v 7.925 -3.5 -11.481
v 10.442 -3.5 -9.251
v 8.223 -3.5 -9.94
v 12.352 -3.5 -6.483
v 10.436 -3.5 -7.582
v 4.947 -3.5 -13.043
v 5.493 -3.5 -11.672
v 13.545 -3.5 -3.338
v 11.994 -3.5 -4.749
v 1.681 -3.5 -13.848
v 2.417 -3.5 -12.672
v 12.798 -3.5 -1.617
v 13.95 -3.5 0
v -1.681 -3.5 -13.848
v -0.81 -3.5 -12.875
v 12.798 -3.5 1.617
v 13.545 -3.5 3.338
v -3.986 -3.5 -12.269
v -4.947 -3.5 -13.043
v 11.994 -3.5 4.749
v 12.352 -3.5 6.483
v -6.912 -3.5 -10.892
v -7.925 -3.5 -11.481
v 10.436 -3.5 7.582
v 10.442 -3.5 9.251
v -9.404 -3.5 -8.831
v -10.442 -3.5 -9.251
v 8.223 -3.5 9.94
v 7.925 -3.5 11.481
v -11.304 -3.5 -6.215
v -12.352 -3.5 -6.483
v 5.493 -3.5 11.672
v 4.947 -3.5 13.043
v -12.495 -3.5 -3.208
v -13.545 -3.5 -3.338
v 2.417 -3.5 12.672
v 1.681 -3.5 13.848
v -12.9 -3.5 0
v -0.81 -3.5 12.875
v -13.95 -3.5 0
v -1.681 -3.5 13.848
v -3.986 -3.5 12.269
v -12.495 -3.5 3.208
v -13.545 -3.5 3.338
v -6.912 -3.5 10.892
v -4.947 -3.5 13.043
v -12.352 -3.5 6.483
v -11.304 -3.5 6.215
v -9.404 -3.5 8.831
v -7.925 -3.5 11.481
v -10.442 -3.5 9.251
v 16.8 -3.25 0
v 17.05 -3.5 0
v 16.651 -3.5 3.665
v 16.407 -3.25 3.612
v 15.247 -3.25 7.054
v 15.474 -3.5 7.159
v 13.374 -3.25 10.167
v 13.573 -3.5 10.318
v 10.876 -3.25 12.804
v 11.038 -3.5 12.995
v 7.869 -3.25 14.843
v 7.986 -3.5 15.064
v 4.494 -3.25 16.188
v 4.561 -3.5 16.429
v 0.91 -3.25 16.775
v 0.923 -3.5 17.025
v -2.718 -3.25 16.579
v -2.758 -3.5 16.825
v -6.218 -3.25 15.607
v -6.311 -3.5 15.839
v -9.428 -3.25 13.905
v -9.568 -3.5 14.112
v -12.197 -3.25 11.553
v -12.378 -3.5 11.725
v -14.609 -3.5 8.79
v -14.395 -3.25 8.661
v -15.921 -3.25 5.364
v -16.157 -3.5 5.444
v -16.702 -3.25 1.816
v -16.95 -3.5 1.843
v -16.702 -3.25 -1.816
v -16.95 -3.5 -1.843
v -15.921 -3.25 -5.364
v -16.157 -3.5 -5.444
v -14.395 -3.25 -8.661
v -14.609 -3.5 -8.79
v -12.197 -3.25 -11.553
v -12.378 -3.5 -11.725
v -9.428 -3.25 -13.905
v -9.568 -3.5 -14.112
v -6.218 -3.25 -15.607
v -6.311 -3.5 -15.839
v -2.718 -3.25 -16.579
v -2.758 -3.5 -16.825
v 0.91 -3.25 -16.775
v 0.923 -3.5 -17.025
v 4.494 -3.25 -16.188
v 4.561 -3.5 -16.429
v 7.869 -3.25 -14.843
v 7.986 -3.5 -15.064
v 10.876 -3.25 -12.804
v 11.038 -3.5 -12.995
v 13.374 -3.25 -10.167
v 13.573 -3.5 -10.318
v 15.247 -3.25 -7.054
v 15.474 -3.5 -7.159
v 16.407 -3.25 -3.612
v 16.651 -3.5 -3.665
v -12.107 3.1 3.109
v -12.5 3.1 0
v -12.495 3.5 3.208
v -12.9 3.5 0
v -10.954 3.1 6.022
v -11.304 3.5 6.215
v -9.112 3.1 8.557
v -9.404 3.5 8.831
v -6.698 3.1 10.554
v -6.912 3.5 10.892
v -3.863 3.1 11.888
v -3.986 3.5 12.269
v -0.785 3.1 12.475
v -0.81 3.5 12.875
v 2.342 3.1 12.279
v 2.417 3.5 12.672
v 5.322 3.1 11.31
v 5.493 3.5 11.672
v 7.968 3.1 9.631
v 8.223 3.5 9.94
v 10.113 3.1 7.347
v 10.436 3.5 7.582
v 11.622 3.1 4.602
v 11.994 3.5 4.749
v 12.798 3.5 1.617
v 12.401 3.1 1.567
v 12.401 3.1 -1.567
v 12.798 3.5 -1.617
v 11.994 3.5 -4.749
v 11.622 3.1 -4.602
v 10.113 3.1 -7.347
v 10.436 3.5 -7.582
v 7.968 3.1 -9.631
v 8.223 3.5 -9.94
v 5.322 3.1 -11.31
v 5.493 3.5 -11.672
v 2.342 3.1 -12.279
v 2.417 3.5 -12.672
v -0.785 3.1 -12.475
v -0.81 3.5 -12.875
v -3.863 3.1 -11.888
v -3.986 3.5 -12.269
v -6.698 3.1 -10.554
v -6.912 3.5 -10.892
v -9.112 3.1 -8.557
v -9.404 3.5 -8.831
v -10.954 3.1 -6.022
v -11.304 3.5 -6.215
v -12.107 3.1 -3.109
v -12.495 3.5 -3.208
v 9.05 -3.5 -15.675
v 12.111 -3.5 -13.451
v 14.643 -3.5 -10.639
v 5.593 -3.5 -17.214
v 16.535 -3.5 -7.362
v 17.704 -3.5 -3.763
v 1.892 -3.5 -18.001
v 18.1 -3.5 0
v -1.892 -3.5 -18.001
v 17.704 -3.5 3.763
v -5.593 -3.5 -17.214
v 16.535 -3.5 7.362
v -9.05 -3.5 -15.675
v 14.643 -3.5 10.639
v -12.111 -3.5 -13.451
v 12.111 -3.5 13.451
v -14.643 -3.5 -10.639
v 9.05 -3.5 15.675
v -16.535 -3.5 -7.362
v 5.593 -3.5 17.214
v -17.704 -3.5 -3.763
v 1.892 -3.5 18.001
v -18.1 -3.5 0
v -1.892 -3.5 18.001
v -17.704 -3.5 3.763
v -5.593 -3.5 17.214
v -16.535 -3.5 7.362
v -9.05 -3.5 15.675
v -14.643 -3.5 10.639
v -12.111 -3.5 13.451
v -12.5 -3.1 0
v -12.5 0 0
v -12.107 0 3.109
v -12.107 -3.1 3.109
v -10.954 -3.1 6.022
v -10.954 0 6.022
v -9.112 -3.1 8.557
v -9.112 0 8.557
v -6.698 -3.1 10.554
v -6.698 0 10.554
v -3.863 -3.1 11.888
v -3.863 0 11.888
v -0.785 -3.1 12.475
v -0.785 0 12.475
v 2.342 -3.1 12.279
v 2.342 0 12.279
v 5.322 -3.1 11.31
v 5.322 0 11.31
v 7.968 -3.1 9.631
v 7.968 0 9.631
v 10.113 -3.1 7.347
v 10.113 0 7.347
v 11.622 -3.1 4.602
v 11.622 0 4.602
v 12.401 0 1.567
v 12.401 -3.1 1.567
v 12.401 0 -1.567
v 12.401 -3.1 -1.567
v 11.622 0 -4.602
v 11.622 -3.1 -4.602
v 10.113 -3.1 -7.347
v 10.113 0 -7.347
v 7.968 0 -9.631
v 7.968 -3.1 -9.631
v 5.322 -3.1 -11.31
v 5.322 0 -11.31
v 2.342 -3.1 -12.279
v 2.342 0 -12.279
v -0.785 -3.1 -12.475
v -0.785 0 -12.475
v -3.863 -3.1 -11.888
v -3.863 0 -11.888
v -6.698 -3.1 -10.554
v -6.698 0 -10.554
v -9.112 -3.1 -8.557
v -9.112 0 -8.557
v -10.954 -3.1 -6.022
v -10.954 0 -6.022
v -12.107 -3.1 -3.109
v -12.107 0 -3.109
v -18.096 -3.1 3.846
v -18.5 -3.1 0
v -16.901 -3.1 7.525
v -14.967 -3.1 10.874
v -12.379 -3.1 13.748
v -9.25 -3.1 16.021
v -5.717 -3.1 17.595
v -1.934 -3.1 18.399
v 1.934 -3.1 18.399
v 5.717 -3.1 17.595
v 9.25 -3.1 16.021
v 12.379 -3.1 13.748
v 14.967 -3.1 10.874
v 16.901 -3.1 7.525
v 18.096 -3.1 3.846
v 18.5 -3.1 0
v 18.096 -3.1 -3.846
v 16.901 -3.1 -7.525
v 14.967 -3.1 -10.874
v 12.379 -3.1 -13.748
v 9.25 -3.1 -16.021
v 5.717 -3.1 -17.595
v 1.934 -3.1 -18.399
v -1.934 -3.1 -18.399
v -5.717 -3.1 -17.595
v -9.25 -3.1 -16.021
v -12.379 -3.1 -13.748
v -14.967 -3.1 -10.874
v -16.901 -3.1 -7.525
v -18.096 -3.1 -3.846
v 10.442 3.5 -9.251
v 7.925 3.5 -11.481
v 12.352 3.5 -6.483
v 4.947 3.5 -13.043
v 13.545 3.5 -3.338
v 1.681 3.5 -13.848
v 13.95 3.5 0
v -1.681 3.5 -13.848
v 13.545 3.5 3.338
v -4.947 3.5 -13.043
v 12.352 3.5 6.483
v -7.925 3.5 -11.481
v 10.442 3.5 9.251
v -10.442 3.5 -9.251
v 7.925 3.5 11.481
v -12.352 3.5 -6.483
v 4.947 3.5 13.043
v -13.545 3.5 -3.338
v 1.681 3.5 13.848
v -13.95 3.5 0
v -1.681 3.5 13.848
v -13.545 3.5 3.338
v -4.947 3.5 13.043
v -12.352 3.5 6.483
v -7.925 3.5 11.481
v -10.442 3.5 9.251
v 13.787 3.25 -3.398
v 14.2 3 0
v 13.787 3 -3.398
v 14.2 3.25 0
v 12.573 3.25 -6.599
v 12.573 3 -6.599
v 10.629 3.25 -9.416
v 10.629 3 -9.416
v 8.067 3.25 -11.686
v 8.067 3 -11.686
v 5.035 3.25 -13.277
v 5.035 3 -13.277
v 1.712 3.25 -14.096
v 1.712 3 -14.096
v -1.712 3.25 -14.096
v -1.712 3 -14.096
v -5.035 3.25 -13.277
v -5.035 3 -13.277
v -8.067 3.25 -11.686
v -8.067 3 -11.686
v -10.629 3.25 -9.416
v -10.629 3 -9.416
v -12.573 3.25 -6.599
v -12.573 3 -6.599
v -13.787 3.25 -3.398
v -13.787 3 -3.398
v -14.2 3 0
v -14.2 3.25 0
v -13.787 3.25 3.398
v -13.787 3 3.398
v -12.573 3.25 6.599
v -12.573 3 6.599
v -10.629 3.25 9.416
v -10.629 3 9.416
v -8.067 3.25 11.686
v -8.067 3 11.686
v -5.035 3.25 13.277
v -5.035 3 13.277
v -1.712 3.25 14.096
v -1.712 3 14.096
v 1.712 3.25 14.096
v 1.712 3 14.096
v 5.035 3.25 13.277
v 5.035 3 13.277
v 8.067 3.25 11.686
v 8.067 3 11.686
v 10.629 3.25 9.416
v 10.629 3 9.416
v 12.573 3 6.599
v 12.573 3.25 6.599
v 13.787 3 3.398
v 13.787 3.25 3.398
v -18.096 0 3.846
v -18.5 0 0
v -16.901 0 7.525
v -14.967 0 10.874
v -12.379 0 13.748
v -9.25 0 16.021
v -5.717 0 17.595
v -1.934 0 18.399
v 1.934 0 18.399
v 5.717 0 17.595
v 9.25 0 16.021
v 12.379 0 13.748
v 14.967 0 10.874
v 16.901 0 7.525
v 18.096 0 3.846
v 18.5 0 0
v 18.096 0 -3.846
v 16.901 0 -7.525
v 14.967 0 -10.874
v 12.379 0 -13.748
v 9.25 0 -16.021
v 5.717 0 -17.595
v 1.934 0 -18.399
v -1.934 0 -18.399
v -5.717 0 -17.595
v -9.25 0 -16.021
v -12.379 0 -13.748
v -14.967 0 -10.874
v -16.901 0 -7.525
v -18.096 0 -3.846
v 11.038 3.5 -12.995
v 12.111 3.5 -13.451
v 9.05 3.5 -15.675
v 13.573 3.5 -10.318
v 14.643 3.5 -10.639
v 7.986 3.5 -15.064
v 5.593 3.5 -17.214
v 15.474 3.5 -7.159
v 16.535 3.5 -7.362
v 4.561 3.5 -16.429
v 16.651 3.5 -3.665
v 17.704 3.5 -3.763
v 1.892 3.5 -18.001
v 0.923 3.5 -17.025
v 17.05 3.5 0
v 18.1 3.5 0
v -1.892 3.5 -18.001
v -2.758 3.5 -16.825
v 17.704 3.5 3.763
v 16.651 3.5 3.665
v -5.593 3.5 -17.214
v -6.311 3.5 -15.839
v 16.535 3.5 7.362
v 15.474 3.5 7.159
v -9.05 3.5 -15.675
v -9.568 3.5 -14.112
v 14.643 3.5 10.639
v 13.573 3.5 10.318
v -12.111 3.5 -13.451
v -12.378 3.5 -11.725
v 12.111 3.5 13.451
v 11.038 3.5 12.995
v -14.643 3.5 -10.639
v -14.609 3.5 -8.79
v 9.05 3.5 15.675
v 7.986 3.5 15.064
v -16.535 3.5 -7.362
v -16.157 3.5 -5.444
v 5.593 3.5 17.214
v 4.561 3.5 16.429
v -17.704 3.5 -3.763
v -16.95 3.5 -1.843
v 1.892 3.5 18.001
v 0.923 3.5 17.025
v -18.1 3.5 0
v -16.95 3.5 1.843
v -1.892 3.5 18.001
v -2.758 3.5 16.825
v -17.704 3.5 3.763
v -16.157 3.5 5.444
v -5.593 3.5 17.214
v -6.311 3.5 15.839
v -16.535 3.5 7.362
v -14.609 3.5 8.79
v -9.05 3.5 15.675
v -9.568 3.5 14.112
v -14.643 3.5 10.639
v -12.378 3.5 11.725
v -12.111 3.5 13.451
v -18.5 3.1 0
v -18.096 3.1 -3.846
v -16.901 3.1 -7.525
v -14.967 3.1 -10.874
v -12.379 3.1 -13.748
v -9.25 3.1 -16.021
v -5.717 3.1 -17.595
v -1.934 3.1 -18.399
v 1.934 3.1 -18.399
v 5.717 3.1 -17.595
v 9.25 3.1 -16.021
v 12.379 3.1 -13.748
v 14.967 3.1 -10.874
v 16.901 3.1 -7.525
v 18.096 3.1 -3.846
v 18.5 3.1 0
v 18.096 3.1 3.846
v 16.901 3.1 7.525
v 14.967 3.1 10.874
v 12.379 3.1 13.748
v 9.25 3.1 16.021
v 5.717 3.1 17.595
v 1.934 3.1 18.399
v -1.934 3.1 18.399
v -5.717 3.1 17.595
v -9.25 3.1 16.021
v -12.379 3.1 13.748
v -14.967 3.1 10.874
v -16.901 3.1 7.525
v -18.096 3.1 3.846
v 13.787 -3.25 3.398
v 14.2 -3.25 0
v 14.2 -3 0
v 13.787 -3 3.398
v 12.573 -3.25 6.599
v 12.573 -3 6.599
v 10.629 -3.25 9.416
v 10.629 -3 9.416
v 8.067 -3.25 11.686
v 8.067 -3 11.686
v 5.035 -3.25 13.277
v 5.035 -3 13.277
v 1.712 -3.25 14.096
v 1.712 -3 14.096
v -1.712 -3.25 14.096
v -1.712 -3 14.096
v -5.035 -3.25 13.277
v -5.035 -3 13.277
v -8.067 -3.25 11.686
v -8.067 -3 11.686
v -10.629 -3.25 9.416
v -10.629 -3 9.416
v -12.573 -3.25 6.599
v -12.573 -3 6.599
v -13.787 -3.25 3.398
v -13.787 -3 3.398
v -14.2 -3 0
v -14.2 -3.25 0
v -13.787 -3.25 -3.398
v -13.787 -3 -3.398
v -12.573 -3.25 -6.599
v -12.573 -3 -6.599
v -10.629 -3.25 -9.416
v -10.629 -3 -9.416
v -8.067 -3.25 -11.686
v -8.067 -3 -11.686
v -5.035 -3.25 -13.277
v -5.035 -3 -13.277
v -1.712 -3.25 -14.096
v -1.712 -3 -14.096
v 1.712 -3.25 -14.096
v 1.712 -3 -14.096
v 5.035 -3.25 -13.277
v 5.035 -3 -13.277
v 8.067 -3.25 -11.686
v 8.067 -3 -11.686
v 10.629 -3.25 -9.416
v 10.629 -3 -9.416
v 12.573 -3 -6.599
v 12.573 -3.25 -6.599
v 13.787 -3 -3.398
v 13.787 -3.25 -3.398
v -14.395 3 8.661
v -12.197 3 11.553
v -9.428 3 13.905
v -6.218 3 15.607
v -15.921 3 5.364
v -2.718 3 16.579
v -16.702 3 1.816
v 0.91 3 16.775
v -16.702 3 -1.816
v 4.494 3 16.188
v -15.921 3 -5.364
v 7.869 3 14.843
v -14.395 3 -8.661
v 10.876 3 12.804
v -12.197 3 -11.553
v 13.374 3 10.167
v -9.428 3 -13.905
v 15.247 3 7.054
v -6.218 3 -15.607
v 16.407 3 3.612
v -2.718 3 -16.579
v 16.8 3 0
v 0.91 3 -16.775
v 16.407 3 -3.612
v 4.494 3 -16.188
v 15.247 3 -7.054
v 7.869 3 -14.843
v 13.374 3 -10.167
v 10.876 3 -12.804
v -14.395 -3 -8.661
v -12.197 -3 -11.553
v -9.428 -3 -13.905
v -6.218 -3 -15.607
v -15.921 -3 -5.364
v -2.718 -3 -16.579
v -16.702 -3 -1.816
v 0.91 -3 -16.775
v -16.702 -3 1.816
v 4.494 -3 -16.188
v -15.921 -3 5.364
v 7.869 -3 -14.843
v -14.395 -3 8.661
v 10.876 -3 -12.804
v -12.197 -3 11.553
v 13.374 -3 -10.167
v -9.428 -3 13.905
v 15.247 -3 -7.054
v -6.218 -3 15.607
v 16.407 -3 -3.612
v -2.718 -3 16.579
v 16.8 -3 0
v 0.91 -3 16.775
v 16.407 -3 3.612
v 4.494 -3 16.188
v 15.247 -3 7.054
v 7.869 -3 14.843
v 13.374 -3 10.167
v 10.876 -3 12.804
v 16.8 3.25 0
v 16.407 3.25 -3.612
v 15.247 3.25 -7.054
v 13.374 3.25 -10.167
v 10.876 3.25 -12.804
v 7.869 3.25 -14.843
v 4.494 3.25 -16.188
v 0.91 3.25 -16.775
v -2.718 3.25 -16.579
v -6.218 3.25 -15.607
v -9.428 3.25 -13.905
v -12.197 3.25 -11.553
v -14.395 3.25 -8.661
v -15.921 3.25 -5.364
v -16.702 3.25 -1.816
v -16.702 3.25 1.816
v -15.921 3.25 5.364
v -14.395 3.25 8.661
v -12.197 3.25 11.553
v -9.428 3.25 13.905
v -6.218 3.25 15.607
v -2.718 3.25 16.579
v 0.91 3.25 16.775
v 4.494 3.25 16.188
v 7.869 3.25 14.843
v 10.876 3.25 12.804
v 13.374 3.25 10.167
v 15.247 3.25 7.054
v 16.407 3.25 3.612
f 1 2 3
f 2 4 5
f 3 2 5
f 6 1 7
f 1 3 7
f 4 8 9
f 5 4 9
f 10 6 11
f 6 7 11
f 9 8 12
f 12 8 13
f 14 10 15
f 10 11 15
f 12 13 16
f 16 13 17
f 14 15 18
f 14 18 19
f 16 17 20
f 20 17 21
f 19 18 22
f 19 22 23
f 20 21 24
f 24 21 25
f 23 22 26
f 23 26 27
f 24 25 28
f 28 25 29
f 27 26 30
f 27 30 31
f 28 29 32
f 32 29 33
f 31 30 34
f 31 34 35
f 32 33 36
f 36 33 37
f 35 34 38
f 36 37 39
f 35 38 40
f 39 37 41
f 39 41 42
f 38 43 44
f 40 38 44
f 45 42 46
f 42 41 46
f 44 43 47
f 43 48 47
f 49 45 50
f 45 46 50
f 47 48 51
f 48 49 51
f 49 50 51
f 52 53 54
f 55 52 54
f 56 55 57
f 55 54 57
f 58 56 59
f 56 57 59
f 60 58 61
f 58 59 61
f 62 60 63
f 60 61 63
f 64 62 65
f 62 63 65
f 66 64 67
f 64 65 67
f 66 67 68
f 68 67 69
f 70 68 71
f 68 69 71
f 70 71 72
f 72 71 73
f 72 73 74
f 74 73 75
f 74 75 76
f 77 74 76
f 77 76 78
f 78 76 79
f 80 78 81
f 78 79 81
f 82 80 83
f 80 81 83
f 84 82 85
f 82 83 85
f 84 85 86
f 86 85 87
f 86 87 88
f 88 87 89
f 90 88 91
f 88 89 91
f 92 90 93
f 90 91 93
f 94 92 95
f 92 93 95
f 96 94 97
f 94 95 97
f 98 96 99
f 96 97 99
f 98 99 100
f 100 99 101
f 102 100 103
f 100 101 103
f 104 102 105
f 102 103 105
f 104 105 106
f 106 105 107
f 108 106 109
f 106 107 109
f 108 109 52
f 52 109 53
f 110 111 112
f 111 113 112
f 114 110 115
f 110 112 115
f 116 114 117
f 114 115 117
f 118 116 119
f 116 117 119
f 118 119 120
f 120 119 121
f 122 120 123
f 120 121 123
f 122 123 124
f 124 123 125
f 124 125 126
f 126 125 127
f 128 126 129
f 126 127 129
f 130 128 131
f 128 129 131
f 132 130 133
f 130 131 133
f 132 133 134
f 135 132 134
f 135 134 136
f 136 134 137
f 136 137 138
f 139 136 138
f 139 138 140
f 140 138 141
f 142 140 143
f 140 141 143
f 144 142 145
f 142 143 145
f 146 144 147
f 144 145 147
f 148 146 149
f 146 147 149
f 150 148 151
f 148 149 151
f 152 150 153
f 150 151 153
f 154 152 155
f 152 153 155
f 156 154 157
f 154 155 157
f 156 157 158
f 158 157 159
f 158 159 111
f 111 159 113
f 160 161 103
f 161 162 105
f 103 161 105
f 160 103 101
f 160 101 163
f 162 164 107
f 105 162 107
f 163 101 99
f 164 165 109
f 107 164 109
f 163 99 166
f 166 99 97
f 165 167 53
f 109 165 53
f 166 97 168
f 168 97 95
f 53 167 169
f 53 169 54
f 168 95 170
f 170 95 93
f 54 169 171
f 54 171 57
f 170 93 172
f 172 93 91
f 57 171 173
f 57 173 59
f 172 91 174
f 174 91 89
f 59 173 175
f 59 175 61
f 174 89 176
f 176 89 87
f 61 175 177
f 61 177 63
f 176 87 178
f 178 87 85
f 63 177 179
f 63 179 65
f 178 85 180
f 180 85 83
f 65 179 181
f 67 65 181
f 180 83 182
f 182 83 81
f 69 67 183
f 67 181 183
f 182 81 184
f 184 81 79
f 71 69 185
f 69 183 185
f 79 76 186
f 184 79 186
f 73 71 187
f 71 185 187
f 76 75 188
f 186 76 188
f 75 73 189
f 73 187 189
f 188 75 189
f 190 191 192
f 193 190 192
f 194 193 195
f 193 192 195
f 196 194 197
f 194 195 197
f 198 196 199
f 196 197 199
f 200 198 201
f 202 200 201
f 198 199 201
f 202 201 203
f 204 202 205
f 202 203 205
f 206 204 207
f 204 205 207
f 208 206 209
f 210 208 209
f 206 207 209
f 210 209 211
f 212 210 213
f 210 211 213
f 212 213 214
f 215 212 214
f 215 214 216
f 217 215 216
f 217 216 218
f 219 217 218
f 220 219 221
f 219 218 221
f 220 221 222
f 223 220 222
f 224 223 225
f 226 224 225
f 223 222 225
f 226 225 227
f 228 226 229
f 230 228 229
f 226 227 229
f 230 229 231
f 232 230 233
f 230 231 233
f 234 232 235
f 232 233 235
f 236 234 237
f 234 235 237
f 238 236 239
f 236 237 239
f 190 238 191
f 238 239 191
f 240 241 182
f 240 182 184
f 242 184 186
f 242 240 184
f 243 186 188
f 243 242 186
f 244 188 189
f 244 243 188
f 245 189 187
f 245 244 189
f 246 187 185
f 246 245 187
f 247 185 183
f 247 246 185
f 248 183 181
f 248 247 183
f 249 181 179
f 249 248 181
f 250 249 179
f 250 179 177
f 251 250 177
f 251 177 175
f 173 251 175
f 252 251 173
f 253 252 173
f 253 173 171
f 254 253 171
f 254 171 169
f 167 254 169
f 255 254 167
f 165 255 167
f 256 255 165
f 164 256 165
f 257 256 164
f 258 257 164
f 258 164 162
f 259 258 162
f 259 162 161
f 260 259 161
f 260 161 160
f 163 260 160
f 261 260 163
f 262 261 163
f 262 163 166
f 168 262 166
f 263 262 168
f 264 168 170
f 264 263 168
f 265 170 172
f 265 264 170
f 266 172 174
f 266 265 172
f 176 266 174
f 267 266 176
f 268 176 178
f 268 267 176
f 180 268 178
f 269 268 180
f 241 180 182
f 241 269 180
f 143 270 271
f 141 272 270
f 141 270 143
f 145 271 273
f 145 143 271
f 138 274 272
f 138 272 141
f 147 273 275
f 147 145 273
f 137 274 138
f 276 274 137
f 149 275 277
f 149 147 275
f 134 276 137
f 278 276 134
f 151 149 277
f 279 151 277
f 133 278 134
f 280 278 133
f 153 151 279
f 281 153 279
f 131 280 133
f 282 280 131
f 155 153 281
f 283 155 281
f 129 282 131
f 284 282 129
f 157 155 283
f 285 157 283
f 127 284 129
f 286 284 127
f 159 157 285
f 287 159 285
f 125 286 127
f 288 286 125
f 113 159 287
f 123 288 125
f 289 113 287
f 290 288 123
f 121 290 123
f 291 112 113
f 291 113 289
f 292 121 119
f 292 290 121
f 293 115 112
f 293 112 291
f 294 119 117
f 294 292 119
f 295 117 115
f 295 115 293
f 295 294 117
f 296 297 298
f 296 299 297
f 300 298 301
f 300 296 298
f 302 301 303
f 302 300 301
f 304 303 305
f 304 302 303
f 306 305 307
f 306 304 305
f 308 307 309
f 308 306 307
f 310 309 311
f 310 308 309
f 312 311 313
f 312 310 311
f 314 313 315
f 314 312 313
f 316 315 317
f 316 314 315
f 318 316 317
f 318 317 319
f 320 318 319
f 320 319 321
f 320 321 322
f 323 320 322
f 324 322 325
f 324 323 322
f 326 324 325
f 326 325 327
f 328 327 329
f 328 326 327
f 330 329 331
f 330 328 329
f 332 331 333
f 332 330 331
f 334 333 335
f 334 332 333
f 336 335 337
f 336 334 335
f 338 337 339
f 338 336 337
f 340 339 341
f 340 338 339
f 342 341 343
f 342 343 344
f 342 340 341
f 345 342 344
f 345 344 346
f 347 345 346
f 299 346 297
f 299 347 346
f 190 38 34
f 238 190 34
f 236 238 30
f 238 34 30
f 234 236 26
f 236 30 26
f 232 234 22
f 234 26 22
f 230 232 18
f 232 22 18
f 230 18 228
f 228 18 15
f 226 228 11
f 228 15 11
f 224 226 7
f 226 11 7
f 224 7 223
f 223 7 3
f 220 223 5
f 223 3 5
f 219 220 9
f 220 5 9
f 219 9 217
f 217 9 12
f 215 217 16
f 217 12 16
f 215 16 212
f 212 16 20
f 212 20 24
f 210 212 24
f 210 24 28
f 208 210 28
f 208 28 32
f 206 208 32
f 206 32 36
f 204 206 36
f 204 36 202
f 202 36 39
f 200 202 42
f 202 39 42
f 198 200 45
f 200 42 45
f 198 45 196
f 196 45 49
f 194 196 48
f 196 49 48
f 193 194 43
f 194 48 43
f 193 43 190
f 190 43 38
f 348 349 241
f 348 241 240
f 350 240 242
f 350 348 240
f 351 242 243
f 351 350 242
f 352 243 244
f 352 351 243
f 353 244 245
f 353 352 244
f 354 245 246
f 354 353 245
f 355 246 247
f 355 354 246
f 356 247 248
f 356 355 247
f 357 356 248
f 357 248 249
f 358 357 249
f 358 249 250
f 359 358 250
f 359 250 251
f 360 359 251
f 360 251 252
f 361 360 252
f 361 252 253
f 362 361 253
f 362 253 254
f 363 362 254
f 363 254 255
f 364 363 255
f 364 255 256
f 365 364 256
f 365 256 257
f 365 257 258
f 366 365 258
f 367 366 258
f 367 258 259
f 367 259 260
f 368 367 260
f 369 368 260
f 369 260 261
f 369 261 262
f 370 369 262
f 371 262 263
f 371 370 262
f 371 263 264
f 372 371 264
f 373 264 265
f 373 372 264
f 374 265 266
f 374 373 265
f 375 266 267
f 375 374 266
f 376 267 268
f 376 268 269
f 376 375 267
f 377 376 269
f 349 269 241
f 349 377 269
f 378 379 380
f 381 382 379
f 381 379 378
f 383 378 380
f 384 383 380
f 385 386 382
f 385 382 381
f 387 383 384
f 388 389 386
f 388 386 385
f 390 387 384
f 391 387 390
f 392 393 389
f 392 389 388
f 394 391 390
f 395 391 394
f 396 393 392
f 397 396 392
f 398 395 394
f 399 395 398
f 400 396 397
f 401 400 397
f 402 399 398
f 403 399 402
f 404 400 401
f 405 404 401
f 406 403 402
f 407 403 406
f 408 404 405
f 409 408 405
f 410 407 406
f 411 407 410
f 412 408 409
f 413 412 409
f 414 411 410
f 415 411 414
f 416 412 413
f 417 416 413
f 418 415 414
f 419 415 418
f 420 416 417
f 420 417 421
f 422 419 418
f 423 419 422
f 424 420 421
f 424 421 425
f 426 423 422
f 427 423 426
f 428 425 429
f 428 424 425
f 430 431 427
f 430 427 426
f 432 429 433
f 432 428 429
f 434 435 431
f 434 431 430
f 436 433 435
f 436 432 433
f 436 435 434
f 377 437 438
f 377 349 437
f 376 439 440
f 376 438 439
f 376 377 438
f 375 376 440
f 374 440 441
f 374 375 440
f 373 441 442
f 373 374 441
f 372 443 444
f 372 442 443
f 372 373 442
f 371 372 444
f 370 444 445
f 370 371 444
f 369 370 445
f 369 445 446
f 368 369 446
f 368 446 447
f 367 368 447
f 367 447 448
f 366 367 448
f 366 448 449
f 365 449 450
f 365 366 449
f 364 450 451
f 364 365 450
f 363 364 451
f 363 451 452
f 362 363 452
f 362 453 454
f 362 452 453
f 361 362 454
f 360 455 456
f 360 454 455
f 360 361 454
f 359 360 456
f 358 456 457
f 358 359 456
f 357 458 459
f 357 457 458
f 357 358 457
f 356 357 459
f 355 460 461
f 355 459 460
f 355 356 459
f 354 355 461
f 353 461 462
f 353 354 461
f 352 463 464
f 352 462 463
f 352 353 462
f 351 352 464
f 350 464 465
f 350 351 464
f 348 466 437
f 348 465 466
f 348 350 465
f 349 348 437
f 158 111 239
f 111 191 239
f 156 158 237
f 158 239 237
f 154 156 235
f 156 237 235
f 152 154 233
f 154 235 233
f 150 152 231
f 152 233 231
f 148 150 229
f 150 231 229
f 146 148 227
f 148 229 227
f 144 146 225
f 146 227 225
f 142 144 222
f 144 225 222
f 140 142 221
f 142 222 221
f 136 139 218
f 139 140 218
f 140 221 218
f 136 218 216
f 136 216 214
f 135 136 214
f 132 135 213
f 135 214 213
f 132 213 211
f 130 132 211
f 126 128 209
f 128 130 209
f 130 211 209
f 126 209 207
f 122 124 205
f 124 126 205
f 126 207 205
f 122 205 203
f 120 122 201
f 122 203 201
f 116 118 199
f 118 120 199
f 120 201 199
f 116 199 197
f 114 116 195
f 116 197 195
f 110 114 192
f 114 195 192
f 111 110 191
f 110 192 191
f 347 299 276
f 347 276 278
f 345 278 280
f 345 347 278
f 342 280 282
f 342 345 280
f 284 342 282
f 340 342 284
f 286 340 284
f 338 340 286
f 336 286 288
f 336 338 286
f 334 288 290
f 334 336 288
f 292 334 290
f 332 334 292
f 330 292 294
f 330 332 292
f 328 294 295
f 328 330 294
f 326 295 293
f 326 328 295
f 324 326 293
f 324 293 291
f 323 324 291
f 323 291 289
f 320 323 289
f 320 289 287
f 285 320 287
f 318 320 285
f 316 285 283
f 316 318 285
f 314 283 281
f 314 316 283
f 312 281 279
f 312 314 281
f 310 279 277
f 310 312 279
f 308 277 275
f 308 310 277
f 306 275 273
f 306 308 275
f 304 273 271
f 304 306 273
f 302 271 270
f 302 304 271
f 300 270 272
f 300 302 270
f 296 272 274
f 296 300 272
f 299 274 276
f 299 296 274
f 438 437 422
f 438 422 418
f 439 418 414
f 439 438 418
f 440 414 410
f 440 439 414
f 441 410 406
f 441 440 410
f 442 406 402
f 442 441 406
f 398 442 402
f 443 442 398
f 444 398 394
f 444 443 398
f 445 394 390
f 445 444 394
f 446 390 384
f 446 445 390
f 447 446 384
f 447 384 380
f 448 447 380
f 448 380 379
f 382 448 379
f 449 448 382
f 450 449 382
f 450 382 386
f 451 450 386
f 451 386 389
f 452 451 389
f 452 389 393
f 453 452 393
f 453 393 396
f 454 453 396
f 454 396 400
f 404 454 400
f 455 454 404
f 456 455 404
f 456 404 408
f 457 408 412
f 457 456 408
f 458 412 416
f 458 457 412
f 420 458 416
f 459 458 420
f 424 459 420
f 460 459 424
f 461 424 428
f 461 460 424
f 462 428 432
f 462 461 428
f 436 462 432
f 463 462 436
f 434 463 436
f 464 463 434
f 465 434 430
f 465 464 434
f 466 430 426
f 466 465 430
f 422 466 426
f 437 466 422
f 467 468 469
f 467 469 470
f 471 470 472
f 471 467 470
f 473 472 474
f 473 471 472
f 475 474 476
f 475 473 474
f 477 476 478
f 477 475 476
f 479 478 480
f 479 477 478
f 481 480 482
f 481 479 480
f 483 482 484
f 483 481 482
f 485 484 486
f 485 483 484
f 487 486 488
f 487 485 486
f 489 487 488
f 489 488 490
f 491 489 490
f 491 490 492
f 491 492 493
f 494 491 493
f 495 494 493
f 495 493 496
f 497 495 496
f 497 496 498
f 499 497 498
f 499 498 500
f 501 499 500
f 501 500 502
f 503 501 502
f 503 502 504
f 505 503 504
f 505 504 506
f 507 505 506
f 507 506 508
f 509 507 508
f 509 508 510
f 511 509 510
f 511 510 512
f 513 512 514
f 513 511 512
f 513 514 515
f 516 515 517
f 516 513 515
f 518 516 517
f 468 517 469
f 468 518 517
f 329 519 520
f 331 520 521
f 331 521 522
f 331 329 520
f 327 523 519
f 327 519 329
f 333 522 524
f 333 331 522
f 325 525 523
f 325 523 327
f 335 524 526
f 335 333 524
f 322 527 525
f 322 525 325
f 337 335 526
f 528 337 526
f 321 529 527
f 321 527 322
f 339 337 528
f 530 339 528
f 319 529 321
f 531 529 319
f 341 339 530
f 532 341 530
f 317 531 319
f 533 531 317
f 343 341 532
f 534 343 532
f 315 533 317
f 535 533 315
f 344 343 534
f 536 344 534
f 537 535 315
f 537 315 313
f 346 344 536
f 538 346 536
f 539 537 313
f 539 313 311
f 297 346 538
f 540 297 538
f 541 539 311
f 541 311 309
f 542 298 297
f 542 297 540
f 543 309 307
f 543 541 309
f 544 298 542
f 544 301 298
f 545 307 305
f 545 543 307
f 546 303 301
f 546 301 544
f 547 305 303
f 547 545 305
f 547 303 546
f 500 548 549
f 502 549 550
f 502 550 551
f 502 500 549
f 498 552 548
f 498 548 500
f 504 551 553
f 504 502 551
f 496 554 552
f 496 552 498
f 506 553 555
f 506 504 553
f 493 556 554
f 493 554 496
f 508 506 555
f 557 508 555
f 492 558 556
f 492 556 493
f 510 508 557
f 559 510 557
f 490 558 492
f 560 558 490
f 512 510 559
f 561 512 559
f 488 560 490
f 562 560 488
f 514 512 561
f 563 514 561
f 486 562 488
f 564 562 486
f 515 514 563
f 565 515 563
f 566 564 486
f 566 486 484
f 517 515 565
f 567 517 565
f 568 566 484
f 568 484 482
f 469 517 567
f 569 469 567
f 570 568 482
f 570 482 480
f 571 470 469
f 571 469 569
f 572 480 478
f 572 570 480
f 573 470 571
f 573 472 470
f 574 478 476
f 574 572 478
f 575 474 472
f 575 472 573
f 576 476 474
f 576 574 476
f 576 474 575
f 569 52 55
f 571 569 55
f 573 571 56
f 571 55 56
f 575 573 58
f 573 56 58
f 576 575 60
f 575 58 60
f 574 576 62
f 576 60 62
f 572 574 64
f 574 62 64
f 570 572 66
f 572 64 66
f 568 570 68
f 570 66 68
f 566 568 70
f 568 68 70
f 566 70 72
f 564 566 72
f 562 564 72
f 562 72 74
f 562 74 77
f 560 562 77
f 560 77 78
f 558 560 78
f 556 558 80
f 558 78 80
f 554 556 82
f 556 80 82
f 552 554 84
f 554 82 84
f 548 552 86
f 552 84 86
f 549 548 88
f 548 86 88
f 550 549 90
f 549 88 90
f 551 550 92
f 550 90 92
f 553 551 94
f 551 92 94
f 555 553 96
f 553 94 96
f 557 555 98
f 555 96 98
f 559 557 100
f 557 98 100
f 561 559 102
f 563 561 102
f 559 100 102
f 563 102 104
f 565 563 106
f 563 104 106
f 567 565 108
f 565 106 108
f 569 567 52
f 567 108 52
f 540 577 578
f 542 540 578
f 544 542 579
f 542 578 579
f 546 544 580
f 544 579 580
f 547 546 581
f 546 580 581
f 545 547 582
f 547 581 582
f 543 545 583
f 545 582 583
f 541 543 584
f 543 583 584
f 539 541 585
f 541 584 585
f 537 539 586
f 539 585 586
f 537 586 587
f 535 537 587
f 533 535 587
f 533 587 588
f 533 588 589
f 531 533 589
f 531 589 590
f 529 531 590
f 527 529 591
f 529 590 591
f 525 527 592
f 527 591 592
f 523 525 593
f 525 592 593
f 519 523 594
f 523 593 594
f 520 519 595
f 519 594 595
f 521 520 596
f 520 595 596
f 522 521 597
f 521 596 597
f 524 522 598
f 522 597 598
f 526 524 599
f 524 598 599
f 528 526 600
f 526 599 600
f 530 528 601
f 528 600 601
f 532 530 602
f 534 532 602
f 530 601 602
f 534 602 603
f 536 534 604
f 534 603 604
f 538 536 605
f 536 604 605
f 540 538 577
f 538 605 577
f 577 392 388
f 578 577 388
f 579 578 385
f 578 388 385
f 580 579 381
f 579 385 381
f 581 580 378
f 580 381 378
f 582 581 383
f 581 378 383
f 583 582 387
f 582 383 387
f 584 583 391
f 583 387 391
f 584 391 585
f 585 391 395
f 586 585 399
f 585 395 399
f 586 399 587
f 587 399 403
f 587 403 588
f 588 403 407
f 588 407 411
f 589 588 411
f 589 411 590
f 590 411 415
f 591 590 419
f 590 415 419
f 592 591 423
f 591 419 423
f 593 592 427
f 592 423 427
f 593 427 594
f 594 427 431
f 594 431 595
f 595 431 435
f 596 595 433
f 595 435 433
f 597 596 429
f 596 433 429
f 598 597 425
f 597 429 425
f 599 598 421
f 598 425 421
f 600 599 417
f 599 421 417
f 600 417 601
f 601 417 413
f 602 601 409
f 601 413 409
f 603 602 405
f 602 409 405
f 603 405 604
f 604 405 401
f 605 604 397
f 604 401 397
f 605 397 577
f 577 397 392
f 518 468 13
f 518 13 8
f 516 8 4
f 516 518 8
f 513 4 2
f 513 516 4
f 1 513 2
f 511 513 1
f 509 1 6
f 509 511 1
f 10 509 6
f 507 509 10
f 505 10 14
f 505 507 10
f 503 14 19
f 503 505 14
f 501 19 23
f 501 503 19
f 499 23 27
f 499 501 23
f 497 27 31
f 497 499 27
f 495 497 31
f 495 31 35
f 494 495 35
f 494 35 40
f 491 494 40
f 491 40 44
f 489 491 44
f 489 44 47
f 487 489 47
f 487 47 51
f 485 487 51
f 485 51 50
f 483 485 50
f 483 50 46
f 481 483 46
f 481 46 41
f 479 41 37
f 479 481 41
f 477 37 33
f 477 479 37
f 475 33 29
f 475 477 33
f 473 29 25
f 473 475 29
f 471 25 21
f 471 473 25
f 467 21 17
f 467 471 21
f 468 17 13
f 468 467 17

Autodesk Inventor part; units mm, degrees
ref_plane "YZ Plane" through (0, 0, 0) normal (1, 0, 0) x (0, 1, 0)
ref_plane "XZ Plane" through (0, 0, 0) normal (0, 1, 0) x (-1, 0, 0)
ref_plane "XY Plane" through (0, 0, 0) normal (0, 0, 1) x (1, 0, 0)
sketch "Эскиз1" plane through (0, 0, 0) normal (0, 1, 0) x (-1, 0, 0)
  circle A0 centre (0, 0) radius 12.5
  circle A1 centre (0, 0) radius 18.5
  dimension "d0" = 25
  dimension "d1" = 37
extrude "Выдавливание1" add sketch "Эскиз1" along normal mid plane 7
sketch "Эскиз2" plane through (0, 3.5, 0) normal (0, 1, 0) x (1, 0, 0)
  circle A0 centre (0, 0) radius 14.2
  circle A1 centre (0, 0) radius 16.8
  circle A2 centre (0, 0) radius 12.5 projected
  dimension "d4" = 2.6
  dimension "d5" = 1.7
extrude "Выдавливание2" cut sketch "Эскиз2" against normal blind 0.5 contours A1
chamfer "Фаска2" distance 0.4 angle 45 4 edges at (18.5, -3.5, 0) (18.5, 3.5, 0) (12.5, -3.5, 0) (12.5, 3.5, 0)
sketch "Эскиз3" plane through (0, -3.5, 0) normal (0, -1, 0) x (1, 0, 0)
  circle A0 centre (0, 0) radius 16.8 projected
  circle A1 centre (0, 0) radius 14.2 projected
extrude "Выдавливание3" cut sketch "Эскиз3" against normal blind 0.5
chamfer "Фаска1" distance 0.25 angle 45 4 edges at (-16.8, 3.5, 0) (-14.2, 3.5, 0) (-16.8, -3.5, 0) (-14.2, -3.5, 0)
properties part number "bearing 37x25x7"
